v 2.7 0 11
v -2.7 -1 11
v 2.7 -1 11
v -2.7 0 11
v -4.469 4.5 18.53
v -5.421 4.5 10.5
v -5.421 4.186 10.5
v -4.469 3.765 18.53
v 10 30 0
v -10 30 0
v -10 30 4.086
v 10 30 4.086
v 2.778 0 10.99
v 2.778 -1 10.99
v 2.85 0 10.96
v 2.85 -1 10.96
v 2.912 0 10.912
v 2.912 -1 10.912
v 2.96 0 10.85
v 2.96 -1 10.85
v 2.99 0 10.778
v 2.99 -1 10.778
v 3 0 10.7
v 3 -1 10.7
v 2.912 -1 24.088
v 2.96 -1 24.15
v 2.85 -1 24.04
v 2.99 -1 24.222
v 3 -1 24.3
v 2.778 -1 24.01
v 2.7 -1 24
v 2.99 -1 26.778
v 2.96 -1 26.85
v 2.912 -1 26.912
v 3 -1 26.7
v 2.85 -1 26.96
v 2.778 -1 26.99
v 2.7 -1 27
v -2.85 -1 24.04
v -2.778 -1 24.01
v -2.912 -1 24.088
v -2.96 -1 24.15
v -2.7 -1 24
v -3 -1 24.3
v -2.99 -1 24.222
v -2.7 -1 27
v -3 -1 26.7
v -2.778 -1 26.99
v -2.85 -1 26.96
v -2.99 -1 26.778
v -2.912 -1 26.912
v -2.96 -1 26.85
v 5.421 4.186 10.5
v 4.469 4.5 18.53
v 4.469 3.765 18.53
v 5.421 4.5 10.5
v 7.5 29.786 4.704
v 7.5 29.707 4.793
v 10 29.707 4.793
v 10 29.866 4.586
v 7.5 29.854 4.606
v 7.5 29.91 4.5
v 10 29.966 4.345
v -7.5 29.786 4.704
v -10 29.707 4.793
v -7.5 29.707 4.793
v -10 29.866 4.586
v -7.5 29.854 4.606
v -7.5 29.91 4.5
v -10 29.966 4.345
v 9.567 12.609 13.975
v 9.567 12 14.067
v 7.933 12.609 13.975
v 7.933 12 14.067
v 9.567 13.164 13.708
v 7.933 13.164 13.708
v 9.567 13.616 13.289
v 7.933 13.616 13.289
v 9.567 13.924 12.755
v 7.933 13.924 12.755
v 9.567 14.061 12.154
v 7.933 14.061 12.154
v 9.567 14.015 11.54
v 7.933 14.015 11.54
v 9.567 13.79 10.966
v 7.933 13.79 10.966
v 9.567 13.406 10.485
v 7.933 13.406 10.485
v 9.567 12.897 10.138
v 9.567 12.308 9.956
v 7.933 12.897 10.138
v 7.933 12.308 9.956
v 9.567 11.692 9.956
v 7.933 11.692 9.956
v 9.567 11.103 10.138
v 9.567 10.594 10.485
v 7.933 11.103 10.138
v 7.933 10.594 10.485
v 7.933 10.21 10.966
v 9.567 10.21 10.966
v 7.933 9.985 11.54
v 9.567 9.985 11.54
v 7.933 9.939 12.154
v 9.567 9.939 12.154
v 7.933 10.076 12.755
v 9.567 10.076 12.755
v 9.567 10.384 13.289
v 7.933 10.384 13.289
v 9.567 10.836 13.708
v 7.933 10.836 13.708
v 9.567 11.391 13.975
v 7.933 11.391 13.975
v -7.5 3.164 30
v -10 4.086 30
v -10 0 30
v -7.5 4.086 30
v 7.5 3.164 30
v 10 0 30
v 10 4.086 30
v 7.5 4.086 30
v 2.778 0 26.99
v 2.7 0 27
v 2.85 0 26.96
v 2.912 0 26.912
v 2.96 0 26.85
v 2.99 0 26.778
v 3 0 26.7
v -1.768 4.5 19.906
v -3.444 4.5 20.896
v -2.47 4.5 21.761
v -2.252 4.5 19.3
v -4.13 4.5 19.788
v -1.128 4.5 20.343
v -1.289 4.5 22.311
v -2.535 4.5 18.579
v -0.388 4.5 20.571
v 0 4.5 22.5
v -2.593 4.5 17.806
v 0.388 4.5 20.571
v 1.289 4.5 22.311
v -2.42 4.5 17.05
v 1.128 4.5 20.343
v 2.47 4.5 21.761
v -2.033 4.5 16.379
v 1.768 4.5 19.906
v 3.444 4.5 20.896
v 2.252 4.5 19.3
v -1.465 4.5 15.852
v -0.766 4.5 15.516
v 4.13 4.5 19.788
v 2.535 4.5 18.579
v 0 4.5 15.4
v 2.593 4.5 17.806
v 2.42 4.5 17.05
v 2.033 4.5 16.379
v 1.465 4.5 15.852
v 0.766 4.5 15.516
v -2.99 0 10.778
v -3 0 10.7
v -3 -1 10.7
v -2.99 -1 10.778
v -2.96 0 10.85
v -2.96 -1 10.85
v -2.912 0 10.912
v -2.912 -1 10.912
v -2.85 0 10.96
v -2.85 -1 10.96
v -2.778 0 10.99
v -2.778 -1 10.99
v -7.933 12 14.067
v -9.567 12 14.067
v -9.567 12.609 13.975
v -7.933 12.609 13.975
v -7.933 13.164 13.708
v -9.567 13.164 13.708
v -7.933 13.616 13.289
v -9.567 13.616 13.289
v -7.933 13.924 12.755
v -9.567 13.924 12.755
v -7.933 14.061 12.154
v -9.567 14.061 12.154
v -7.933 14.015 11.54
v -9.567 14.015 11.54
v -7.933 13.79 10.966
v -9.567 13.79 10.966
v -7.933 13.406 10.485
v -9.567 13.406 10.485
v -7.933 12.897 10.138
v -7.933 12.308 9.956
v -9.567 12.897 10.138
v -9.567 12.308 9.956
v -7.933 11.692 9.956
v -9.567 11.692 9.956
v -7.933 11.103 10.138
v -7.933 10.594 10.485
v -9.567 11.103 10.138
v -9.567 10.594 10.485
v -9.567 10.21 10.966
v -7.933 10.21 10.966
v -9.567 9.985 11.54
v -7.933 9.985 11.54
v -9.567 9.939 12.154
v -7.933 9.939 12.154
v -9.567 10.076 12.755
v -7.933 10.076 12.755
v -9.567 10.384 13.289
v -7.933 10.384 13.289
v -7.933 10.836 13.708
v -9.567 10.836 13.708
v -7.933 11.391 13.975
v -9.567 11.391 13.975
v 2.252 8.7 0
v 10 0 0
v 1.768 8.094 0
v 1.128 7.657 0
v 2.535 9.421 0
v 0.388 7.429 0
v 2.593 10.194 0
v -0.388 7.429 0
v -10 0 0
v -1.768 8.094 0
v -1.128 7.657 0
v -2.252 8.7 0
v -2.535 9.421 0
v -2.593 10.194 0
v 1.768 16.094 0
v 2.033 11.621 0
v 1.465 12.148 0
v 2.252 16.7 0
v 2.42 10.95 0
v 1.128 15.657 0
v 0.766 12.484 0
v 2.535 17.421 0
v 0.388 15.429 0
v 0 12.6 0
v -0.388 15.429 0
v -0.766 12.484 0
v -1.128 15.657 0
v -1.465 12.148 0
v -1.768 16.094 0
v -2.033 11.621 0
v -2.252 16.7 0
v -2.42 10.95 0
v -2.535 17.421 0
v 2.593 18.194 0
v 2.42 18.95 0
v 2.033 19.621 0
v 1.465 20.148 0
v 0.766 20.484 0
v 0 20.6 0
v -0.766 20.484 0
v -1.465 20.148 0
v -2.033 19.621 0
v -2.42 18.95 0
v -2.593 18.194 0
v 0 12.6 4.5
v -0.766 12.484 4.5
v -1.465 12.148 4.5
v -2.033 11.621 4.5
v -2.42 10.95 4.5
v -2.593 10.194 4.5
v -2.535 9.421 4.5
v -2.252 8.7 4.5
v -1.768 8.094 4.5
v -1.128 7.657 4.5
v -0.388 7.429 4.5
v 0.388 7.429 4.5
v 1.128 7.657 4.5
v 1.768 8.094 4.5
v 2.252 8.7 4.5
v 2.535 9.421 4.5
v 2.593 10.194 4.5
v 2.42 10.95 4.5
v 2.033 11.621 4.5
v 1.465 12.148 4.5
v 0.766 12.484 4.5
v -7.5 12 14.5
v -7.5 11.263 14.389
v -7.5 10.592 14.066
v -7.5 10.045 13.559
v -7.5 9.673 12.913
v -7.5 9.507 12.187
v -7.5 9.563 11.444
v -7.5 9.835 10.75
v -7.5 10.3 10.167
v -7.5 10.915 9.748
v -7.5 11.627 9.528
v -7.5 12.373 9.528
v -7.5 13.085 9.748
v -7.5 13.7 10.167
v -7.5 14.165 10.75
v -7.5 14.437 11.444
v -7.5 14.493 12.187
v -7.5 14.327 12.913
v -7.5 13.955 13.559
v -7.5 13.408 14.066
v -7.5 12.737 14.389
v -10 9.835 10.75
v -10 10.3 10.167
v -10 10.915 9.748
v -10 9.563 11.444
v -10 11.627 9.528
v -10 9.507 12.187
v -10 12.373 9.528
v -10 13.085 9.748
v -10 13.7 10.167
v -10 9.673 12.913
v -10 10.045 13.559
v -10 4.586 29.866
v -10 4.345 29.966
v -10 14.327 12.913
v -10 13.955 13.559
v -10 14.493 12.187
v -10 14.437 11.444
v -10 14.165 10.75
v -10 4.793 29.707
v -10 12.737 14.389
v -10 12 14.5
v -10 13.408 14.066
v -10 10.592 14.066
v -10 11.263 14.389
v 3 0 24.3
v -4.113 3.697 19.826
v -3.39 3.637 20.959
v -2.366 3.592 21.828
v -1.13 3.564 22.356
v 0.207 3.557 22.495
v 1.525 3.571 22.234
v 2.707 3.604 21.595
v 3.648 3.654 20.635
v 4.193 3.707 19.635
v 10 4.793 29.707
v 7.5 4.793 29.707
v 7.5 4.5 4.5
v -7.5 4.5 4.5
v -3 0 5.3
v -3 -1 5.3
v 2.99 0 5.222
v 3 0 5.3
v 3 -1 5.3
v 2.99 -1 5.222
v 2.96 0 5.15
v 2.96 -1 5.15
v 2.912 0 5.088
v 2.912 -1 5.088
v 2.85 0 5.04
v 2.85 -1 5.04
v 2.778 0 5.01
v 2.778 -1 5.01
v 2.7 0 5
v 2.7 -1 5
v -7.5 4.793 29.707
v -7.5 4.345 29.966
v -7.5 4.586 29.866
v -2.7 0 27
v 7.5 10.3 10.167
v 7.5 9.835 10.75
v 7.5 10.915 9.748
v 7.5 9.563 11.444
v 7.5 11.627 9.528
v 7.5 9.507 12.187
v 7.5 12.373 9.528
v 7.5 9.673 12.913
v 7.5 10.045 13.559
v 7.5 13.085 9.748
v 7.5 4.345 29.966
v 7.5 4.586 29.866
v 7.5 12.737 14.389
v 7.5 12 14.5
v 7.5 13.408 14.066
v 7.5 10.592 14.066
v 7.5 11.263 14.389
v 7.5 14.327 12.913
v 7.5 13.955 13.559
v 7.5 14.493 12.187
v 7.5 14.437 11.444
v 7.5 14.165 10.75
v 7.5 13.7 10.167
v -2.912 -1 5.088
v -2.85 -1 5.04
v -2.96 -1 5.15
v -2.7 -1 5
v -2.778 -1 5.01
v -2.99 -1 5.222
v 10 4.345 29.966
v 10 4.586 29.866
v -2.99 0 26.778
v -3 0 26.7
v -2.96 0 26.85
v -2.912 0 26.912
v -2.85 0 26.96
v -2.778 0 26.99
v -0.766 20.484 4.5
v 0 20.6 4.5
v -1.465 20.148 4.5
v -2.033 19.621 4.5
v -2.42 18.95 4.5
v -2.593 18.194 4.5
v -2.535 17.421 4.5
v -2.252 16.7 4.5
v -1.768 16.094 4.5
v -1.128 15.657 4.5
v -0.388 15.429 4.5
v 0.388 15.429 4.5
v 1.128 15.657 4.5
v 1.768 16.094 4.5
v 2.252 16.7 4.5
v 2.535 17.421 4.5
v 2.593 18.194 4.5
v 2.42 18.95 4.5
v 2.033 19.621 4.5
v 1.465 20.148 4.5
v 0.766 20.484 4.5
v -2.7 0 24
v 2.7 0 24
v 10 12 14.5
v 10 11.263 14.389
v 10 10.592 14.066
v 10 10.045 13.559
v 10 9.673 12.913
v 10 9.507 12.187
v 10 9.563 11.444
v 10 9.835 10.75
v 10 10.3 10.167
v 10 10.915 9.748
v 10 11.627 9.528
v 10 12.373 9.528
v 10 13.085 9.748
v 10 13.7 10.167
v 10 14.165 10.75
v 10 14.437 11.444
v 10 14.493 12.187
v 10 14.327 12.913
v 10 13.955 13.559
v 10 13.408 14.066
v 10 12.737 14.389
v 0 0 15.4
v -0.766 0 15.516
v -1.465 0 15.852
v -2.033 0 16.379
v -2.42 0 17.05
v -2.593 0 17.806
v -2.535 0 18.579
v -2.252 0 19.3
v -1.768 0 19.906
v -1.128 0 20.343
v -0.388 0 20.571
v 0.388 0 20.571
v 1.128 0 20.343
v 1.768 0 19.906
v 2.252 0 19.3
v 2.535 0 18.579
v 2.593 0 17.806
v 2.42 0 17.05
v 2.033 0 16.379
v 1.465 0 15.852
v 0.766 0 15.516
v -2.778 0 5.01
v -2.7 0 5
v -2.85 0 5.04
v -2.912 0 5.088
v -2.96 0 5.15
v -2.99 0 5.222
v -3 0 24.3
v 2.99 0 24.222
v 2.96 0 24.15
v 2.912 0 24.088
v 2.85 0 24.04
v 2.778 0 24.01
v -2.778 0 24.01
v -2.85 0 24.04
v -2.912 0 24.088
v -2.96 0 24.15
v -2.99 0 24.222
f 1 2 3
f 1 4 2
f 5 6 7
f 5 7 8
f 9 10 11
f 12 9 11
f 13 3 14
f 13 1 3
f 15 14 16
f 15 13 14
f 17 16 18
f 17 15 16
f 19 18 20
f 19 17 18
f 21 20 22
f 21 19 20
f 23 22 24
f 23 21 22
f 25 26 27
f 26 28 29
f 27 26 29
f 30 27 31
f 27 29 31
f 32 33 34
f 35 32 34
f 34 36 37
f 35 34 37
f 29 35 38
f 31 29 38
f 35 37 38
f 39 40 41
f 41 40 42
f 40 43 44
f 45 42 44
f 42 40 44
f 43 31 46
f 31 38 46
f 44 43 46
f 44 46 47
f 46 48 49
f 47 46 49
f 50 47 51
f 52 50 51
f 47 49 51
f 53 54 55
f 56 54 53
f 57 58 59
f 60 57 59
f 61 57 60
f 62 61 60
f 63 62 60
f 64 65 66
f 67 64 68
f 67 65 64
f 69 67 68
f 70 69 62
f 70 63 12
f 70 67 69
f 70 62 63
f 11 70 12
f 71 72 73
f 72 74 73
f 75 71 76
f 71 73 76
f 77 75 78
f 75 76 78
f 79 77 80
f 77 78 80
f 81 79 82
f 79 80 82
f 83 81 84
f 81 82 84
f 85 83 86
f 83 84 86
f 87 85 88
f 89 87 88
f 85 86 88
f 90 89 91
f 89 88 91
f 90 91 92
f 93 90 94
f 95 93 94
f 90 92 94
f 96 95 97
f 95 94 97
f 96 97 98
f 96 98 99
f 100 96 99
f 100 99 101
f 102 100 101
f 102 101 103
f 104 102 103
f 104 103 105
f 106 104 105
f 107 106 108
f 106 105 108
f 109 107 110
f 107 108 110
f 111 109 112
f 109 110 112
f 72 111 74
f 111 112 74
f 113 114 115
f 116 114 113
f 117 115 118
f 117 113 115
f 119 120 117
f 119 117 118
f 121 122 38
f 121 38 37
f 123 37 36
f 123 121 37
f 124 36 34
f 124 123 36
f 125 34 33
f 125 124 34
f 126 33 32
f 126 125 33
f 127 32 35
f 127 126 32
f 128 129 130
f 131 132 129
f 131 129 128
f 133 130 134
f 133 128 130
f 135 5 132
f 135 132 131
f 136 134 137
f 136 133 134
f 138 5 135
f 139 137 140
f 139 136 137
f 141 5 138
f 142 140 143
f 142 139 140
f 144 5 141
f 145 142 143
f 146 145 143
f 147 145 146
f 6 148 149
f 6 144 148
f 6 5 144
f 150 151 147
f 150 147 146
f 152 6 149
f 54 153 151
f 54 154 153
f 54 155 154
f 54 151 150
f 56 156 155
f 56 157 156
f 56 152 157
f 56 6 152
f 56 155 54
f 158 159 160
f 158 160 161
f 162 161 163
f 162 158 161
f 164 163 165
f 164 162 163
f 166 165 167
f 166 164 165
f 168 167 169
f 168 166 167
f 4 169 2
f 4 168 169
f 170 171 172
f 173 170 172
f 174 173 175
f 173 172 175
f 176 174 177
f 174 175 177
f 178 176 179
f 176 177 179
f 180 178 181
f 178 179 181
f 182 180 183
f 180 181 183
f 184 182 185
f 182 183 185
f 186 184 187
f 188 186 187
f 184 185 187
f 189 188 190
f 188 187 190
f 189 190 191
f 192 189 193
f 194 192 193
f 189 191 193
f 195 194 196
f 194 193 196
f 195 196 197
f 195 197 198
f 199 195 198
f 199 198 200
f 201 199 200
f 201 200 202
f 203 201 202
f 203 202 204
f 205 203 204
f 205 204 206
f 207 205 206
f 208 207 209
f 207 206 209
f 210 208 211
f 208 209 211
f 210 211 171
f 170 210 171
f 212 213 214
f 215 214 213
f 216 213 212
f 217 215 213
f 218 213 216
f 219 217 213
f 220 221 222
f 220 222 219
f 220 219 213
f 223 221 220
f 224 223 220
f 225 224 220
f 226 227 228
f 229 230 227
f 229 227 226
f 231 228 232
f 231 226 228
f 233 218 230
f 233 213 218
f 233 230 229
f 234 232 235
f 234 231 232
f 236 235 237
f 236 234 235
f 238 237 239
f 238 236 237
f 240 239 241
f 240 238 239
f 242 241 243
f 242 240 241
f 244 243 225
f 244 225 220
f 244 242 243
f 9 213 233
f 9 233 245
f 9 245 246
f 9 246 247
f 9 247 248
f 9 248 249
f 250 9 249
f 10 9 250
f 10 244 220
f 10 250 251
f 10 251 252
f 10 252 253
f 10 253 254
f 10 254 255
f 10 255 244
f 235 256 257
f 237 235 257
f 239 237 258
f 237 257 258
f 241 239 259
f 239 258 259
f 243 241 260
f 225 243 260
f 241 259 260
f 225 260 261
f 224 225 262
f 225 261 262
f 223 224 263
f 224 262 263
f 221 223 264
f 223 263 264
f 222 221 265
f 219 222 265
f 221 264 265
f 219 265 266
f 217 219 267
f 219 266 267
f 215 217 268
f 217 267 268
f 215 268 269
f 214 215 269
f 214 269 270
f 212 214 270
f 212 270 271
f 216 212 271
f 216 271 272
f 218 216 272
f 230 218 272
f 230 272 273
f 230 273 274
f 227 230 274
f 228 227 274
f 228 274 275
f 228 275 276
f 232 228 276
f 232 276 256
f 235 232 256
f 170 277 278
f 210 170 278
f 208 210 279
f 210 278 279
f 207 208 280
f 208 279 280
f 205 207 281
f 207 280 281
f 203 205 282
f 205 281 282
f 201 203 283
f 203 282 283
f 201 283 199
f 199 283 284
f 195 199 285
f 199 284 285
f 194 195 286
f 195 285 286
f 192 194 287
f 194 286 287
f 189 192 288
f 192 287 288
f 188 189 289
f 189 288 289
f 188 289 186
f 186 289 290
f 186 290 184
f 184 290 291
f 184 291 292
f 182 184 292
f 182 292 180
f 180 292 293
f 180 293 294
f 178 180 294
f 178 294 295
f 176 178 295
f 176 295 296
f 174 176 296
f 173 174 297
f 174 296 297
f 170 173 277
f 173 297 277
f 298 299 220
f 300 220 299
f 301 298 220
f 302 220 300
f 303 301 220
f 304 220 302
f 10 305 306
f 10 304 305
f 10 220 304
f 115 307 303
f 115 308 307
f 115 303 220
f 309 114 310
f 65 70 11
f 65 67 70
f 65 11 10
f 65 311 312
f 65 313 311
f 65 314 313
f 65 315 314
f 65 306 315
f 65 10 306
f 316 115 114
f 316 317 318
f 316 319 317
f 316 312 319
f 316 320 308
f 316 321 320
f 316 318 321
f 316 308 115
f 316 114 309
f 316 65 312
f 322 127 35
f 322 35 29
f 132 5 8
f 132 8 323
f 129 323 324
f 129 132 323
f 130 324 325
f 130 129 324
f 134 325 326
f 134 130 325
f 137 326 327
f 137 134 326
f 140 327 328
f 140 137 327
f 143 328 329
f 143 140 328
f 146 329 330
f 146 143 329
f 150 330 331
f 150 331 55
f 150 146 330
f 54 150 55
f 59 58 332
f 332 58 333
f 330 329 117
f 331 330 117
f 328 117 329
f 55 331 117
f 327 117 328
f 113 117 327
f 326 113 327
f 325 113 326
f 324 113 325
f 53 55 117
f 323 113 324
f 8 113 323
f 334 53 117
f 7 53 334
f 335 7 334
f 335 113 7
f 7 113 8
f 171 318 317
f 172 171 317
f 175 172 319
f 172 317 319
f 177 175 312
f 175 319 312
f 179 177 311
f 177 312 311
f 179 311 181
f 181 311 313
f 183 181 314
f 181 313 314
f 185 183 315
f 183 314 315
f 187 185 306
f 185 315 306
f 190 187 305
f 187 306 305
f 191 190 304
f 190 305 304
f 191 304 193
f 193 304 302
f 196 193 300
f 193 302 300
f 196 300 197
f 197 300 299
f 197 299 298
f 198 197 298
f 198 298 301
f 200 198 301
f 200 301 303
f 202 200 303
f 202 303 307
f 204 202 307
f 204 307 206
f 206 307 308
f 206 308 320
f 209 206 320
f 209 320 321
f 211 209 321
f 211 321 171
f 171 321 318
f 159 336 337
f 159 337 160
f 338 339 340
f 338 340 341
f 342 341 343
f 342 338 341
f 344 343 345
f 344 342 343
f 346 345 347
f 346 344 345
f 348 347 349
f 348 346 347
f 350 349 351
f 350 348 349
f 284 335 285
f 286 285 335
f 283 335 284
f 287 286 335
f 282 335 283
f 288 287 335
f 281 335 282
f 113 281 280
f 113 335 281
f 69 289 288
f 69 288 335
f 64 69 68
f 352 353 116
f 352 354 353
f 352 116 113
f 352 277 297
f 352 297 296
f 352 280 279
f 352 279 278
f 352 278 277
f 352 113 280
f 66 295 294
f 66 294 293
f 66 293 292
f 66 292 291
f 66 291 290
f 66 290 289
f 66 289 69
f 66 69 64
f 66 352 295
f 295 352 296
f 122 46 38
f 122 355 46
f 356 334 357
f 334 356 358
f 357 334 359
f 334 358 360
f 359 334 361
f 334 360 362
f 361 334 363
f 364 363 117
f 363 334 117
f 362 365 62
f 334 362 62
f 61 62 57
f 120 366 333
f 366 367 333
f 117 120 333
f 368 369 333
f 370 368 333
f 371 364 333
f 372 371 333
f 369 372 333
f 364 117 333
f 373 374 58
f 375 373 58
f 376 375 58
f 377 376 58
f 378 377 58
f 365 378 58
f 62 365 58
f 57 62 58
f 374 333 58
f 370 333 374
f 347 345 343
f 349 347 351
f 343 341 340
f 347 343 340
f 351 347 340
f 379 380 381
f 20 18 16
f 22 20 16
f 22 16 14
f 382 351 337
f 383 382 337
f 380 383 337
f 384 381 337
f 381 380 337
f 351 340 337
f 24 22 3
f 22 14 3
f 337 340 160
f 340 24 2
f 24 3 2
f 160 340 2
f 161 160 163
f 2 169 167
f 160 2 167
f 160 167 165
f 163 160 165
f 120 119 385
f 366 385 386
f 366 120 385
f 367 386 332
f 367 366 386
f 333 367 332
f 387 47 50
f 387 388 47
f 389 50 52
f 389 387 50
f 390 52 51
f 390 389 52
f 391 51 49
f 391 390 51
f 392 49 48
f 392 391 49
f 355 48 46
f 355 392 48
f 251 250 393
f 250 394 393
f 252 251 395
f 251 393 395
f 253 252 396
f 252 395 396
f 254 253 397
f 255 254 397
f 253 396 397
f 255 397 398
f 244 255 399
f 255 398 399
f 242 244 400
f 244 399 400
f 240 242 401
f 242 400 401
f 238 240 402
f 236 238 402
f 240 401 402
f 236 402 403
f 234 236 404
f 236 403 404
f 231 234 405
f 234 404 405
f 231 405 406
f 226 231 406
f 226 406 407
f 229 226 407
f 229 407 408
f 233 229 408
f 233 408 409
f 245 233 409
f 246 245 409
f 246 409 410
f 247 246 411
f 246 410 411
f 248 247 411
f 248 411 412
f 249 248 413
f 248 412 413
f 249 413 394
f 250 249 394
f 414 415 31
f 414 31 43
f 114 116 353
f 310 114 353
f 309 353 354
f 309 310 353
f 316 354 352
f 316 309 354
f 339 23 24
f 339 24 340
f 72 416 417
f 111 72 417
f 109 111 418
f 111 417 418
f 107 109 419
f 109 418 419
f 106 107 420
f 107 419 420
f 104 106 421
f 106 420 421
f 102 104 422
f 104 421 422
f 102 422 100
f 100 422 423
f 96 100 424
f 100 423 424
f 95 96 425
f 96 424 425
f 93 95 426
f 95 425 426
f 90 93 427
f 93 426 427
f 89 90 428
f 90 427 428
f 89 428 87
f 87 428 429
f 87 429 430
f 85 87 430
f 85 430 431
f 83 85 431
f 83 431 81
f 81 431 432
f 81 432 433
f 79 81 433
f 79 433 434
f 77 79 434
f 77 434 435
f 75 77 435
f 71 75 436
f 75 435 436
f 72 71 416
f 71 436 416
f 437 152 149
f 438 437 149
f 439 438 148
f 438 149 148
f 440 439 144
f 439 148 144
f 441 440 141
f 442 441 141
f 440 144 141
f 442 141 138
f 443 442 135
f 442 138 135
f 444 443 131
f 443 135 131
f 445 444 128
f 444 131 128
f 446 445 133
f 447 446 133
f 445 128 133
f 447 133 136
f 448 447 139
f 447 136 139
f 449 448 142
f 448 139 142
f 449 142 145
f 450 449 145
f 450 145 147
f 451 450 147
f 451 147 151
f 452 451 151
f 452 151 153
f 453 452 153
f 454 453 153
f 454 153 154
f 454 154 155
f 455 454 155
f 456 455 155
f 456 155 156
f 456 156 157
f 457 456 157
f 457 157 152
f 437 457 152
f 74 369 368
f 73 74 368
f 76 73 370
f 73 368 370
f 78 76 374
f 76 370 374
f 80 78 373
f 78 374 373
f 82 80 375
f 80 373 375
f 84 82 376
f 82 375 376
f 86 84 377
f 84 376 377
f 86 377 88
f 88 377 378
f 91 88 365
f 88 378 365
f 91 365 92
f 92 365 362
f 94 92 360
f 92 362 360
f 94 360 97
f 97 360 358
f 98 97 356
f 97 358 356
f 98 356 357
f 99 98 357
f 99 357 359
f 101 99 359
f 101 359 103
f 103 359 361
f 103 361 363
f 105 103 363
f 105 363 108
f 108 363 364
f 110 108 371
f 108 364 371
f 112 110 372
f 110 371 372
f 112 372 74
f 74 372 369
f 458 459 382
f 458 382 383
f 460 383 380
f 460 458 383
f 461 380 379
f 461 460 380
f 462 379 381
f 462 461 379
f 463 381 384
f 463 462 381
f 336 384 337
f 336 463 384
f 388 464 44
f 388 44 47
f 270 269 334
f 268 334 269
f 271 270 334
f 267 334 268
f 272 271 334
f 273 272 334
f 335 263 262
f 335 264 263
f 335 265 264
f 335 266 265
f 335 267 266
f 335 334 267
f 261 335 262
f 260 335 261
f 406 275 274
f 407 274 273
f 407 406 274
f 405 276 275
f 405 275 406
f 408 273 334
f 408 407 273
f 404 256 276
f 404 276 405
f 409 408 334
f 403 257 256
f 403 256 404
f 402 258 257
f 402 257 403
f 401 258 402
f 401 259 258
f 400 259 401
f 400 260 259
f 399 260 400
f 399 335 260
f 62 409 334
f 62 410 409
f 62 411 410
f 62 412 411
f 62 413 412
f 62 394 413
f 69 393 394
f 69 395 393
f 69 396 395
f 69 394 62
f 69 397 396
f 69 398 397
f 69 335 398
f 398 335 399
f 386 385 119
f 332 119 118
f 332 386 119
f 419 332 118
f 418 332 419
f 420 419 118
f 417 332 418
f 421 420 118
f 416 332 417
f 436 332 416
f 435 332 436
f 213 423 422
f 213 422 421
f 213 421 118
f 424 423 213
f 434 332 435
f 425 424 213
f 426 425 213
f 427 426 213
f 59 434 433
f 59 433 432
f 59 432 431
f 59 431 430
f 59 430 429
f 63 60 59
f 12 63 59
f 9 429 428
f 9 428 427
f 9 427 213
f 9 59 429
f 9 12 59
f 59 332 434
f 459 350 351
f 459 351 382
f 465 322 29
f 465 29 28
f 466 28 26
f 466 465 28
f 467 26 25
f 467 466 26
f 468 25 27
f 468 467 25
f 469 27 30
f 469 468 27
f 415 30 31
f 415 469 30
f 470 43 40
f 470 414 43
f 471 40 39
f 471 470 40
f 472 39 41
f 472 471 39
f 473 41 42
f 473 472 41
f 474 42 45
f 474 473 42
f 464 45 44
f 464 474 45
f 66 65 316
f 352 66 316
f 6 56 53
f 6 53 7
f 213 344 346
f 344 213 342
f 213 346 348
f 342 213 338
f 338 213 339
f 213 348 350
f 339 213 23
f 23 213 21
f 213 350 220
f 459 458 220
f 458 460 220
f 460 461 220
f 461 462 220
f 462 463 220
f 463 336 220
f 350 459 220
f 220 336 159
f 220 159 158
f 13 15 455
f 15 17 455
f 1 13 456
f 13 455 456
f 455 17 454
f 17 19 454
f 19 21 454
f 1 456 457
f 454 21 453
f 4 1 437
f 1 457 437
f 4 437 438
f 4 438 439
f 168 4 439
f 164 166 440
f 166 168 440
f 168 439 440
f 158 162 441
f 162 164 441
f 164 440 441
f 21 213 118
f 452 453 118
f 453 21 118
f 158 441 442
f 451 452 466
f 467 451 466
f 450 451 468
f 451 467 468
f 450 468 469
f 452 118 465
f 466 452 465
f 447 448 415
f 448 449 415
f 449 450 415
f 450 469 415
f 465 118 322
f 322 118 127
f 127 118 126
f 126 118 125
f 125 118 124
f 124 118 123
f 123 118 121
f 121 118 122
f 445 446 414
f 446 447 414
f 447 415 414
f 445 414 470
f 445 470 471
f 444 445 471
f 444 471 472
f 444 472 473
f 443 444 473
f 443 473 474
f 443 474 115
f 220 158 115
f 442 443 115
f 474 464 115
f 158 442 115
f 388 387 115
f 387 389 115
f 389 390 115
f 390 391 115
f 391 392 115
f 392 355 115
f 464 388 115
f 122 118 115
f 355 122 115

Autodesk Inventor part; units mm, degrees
sketch "Sketch_15" plane through (0, 0, 0) normal (1, 0, 0) x (0, 1, 0)
  line L0 (4.0858, 30) -> (0, 30)
  line L1 (0, 30) -> (0, 0)
  line L2 (0, 0) -> (30, 0)
  line L3 (30, 0) -> (30, 4.0858)
  arc A0 (30, 4.0858) -> (29.7071, 4.7929) centre (29, 4.0858) ccw
  line L4 (29.7071, 4.7929) -> (4.7929, 29.7071)
  arc A1 (4.7929, 29.7071) -> (4.0858, 30) centre (4.0858, 29) ccw
extrude "Extrusion1" add sketch "Sketch_15" along normal mid plane 20
sketch "Sketch_16" plane through (0, 0, 0) normal (1, 0, 0) x (0, 1, 0)
  line L0 (34.5, 34.5) -> (2.9278, 34.5)
  line L1 (2.9278, 34.5) -> (4.5, 4.5)
  line L2 (4.5, 4.5) -> (34.5, 4.5)
  line L3 (34.5, 4.5) -> (34.5, 34.5)
extrude "Extrusion2" cut sketch "Sketch_16" along normal mid plane 15
sketch "Sketch_17" plane through (0, 4.5, 0) normal (0, 1, 0) x (1, 0, 0)
  line L0 (-5.4209, -10.5) -> (-4.4687, -18.5299)
  arc A0 (-4.4687, -18.5299) -> (4.4687, -18.5299) centre (0, -18) ccw
  line L1 (4.4687, -18.5299) -> (5.4209, -10.5)
  line L2 (5.4209, -10.5) -> (-5.4209, -10.5)
extrude "Extrusion3" add sketch "Sketch_17" against normal blind 2.25
sketch "Sketch_18" plane through (0, 12, 0) normal (0, 1, 0) x (1, 0, 0)
  line L0 (7.5, -12) -> (10, -12)
  line L1 (10, -12) -> (10, -14.5)
  line L2 (10, -14.5) -> (9.567, -14.067)
  line L3 (9.567, -14.067) -> (7.933, -14.067)
  line L4 (7.933, -14.067) -> (7.5, -14.5)
  line L5 (7.5, -14.5) -> (7.5, -12)
  line L6 (7.5, -12) -> (10, -12)
revolve "Revolution1" cut sketch "Sketch_18" angle 360 about axis through (7.5, 12, 12) along (-1, 0, 0)
thread "Thread1" size "M5x0.8" class "6H" standard "ISO Metric profile" full length
sketch "Sketch_19" plane through (0, 12, 0) normal (0, 1, 0) x (1, 0, 0)
  line L0 (-10, -12) -> (-7.5, -12)
  line L1 (-7.5, -12) -> (-7.5, -14.5)
  line L2 (-7.5, -14.5) -> (-7.933, -14.067)
  line L3 (-7.933, -14.067) -> (-9.567, -14.067)
  line L4 (-9.567, -14.067) -> (-10, -14.5)
  line L5 (-10, -14.5) -> (-10, -12)
  line L6 (-10, -12) -> (-7.5, -12)
revolve "Revolution2" cut sketch "Sketch_19" angle 360 about axis through (-10, 12, 12) along (-1, 0, 0)
thread "Thread2" size "M5x0.8" class "6H" standard "ISO Metric profile" full length
sketch "Sketch6" plane through (10, 30, 0) normal (0, 0, -1) x (-1, 0, 0)
  point P0 (10, -12)
hole "Hole1" at (0, 18, 0) direction (0, 0, 1) diameter 5.2 depth 4.5
sketch "Sketch7" plane through (10, 30, 0) normal (0, 0, -1) x (-1, 0, 0)
  point P0 (10, -20)
hole "Hole2" at (0, 10, 0) direction (0, 0, 1) diameter 5.2 depth 4.5
sketch "Sketch8" plane through (-10, 0, 0) normal (0, -1, 0) x (1, 0, 0)
  point P0 (10, 18)
hole "Hole3" at (0, 0, 18) direction (0, 1, 0) diameter 5.2 depth 4.5
sketch "Sketch_1" plane through (0, 0, 0) normal (0, 1, 0) x (-1, 0, 0)
  line L0 (10, 30) -> (-10, 30)
  line L1 (-10, 30) -> (-10, 0)
  line L2 (-10, 0) -> (10, 0)
  line L3 (10, 0) -> (10, 30)
extrude "Extrusion4" add sketch "Sketch_1" against normal blind 1
sketch "Sketch_4" plane through (0, 0, 0) normal (0, 1, 0) x (-1, 0, 0)
  line L0 (10, 30) -> (-10, 30)
  line L1 (-10, 30) -> (-10, 0)
  line L2 (-10, 0) -> (10, 0)
  line L3 (10, 0) -> (10, 30)
  line L4 (3, 24.3) -> (3, 26.7)
  arc A0 (3, 26.7) -> (2.7, 27) centre (2.7, 26.7) ccw
  line L5 (2.7, 27) -> (-2.7, 27)
  arc A1 (-2.7, 27) -> (-3, 26.7) centre (-2.7, 26.7) ccw
  line L6 (-3, 26.7) -> (-3, 24.3)
  arc A2 (-3, 24.3) -> (-2.7, 24) centre (-2.7, 24.3) ccw
  line L7 (-2.7, 24) -> (2.7, 24)
  arc A3 (2.7, 24) -> (3, 24.3) centre (2.7, 24.3) ccw
  line L8 (3, 5.3) -> (3, 10.7)
  arc A4 (3, 10.7) -> (2.7, 11) centre (2.7, 10.7) ccw
  line L9 (2.7, 11) -> (-2.7, 11)
  arc A5 (-2.7, 11) -> (-3, 10.7) centre (-2.7, 10.7) ccw
  line L10 (-3, 10.7) -> (-3, 5.3)
  arc A6 (-3, 5.3) -> (-2.7, 5) centre (-2.7, 5.3) ccw
  line L11 (-2.7, 5) -> (2.7, 5)
  arc A7 (2.7, 5) -> (3, 5.3) centre (2.7, 5.3) ccw
extrude "Extrusion5" cut sketch "Sketch_4" against normal blind 1
ref_plane "bracket_to_bolt_XY" through (1, 10, 0) normal (0, 0, 1) x (1, 0, 0)
ref_plane "bracket_to_bolt_YZ" through (1, 10, 0) normal (1, 0, 0) x (0, 1, 0)
ref_plane "bracket_to_bolt_ZX" through (1, 10, 0) normal (0, 1, 0) x (0, 0, 1)
ref_plane "bracket_to_dummy_XY" through (0, 0, 0) normal (0, 1, 0) x (1, 0, 0)
ref_plane "bracket_to_dummy_YZ" through (0, 0, 0) normal (1, 0, 0) x (0, 0, -1)
ref_plane "bracket_to_dummy_ZX" through (0, 0, 0) normal (0, 0, -1) x (0, 1, 0)
ref_plane "to_bolt_4_7_base_XY" through (0, 4.5, 18) normal (0, 1, 0) x (1, 0, 0)
ref_plane "to_bolt_4_7_base_YZ" through (0, 4.5, 18) normal (1, 0, 0) x (0, 0, -1)
ref_plane "to_bolt_4_7_base_ZX" through (0, 4.5, 18) normal (0, 0, -1) x (0, 1, 0)
ref_plane "to_bolt_row_4_to_7_XY" through (0, 18, 4.5) normal (0, 0, 1) x (1, 0, 0)
ref_plane "to_bolt_row_4_to_7_YZ" through (0, 18, 4.5) normal (1, 0, 0) x (0, 1, 0)
ref_plane "to_bolt_row_4_to_7_ZX" through (0, 18, 4.5) normal (0, 1, 0) x (0, 0, 1)
ref_plane "to_nut_base_4_7_XY" through (0, -2, 18) normal (0, 1, 0) x (1, 0, 0)
ref_plane "to_nut_base_4_7_YZ" through (0, -2, 18) normal (1, 0, 0) x (0, 0, -1)
ref_plane "to_nut_base_4_7_ZX" through (0, -2, 18) normal (0, 0, -1) x (0, 1, 0)
ref_plane "to_nut_row_4_to_7_XY" through (0, 18, -2) normal (0, 0, 1) x (1, 0, 0)
ref_plane "to_nut_row_4_to_7_YZ" through (0, 18, -2) normal (1, 0, 0) x (0, 1, 0)
ref_plane "to_nut_row_4_to_7_ZX" through (0, 18, -2) normal (0, 1, 0) x (0, 0, 1)
properties part number "HBLFSNK5-C-SEPh5"
